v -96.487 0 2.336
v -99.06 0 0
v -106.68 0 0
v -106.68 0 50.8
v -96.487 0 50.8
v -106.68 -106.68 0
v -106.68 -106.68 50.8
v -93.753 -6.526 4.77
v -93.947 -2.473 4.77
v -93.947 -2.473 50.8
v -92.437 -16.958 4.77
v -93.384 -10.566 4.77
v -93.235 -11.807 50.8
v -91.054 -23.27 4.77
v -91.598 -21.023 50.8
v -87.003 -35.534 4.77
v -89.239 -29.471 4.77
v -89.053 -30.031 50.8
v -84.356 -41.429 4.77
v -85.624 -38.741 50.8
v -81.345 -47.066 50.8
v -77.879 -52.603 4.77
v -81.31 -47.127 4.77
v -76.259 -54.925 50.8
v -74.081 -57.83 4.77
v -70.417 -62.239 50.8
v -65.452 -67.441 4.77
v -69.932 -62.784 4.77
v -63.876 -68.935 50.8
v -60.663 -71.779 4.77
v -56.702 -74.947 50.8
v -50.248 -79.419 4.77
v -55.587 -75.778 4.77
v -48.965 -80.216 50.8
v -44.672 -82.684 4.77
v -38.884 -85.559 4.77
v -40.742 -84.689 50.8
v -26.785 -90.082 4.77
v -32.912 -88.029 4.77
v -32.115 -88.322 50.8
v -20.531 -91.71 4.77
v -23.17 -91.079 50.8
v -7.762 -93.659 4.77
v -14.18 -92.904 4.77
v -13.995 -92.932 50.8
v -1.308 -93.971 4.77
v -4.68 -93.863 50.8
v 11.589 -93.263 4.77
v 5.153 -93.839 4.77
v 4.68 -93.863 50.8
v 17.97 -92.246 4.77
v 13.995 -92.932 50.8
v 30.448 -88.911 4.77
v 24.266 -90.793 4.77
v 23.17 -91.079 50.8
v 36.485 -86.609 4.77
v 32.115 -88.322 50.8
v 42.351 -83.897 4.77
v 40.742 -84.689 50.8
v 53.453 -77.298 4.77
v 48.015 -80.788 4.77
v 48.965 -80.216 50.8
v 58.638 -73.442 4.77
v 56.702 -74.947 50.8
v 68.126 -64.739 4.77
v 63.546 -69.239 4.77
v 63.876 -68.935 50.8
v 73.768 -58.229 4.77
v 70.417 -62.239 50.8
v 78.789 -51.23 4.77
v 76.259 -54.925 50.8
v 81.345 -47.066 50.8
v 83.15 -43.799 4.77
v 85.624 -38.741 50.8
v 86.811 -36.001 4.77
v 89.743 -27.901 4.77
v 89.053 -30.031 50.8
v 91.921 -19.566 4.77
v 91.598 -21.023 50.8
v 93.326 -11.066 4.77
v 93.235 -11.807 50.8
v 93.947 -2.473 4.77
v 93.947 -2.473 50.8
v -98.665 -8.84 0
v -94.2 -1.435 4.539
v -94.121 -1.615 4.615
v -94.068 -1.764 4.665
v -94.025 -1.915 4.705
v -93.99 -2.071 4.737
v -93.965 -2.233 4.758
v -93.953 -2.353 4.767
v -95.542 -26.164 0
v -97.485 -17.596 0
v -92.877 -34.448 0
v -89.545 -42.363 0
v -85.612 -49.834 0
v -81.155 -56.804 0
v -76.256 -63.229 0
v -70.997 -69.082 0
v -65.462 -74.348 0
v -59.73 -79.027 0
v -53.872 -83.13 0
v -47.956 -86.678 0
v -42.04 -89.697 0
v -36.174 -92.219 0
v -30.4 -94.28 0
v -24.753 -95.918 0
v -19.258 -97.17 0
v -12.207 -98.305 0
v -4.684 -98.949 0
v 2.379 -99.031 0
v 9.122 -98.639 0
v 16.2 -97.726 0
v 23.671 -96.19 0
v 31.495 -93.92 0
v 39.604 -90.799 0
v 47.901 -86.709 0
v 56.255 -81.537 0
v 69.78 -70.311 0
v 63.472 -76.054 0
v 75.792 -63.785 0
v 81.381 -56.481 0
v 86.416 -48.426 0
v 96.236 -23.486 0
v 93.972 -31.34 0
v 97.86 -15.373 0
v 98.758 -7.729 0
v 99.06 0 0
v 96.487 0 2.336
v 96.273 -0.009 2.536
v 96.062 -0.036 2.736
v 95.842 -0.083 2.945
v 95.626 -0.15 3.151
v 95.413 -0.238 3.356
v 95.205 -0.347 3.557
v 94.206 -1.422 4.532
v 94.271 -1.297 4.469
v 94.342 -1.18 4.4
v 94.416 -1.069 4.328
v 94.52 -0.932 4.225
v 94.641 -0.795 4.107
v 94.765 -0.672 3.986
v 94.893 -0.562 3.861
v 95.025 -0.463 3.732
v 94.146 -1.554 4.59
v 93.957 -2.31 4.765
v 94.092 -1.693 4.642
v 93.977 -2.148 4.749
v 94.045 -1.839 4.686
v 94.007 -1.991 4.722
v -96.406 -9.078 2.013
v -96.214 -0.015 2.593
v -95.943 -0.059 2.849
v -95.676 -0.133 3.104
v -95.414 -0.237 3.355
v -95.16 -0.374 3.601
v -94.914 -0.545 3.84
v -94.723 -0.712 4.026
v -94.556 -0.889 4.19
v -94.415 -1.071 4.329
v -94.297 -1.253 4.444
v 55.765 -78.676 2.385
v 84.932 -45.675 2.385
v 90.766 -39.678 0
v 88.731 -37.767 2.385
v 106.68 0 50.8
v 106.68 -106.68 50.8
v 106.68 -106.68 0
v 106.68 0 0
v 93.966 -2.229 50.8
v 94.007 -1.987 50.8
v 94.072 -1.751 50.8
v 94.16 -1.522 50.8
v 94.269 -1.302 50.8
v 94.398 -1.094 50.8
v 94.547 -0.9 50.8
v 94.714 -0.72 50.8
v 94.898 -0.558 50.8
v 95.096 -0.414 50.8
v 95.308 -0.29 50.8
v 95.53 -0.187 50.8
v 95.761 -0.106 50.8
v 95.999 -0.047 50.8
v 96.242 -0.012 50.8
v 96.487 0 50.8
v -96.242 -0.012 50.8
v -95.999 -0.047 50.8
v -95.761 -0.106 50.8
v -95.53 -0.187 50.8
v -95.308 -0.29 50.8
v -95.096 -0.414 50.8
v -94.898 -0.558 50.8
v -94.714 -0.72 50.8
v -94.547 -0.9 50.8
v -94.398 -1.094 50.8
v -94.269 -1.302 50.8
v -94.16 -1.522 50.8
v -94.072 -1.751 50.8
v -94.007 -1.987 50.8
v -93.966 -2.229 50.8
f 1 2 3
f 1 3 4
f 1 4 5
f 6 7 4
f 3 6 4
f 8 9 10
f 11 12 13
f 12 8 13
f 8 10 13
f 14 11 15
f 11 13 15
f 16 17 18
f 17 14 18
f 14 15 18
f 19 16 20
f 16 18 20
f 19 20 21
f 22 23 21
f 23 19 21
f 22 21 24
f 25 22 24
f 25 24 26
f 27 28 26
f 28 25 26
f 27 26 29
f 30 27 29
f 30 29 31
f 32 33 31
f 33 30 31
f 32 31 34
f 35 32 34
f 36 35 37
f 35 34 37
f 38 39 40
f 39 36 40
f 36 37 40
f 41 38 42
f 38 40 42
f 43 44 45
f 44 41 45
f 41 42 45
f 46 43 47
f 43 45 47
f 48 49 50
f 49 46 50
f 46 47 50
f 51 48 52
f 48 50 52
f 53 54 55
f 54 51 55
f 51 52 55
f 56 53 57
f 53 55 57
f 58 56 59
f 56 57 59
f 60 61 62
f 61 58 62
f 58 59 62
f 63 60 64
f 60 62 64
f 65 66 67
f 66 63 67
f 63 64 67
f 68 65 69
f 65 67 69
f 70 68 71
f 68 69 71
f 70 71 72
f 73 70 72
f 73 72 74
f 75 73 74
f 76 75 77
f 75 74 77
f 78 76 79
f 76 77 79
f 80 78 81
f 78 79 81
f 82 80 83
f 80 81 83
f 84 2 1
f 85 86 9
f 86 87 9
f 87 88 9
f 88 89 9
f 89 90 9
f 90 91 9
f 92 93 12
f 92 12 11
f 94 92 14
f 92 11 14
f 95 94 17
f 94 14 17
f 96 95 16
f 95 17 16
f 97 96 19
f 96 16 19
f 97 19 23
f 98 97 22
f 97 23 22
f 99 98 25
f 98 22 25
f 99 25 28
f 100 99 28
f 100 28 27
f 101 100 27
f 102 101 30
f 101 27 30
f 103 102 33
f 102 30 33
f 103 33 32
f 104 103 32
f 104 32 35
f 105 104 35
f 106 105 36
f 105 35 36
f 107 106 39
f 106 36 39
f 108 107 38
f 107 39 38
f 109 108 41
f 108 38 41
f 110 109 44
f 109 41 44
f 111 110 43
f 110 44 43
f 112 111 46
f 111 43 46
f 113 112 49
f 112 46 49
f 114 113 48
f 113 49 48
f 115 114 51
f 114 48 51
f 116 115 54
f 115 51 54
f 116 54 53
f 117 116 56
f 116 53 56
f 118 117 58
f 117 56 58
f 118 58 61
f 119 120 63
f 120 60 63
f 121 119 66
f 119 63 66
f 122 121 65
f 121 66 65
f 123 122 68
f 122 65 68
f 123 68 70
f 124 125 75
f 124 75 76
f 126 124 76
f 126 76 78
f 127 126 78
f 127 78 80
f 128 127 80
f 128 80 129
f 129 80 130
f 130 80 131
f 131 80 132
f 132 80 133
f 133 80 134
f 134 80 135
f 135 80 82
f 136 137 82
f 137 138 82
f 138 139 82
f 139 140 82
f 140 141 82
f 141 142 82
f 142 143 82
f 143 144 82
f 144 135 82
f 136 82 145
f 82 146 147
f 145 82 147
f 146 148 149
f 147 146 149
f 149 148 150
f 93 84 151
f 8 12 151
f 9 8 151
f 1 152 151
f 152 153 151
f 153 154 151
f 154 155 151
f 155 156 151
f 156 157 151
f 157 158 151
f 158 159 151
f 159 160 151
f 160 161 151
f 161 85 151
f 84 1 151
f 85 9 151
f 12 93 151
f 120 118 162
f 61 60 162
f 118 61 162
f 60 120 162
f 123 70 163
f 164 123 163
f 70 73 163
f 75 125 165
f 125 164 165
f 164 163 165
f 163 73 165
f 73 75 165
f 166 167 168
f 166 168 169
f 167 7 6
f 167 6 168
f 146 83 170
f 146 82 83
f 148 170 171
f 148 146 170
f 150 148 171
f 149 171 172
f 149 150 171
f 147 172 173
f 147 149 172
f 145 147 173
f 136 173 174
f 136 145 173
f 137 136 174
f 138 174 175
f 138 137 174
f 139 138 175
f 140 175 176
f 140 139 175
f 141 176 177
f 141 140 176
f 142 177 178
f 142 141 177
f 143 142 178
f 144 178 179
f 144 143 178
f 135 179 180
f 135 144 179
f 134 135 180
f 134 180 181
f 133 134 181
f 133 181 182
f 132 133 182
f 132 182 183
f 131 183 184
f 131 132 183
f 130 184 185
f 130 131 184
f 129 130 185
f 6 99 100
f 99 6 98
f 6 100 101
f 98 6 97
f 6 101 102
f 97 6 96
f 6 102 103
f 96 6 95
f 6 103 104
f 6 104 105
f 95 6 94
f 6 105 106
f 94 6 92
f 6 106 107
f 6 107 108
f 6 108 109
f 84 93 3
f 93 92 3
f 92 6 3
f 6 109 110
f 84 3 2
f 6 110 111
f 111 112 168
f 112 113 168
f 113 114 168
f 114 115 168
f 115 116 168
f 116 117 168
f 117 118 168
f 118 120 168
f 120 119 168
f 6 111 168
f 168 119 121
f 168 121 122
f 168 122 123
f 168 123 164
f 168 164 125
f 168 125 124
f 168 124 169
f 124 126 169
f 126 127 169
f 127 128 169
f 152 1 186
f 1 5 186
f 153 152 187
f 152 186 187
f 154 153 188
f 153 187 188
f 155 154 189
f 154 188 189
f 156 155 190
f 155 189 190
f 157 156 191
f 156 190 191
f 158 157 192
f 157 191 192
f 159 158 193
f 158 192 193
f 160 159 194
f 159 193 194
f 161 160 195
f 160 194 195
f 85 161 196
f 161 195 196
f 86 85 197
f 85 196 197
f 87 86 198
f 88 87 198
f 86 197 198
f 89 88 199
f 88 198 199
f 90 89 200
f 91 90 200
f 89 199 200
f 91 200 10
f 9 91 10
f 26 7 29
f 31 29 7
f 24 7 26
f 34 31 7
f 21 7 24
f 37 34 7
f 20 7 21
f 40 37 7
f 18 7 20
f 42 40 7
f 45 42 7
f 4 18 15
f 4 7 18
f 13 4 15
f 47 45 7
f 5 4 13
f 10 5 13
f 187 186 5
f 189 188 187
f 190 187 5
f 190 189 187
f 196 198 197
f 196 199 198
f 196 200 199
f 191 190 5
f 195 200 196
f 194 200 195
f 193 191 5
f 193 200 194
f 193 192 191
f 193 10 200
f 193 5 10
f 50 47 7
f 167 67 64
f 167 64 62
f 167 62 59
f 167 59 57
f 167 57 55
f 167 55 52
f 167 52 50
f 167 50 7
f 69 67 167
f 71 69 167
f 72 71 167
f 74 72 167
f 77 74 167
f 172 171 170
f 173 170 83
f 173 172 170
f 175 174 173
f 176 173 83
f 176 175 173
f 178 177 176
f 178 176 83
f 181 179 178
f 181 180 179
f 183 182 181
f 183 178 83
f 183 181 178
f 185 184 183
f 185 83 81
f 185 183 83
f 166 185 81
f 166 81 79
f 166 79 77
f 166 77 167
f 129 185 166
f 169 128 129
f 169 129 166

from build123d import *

# Parameters (mm, degrees)
SKETCH2_W           = 213.36
SKETCH2_H           = 213.36
SKETCH2_R           = 93.98
BOSS_EXTRUDE1_DEPTH = 50.8
SKETCH4_W           = 431.498092941
SKETCH4_H           = 427.351859682
CUT_EXTRUDE1_DEPTH  = 106.68
FILLET1_R           = 2.54


with BuildPart() as part:
    # Sketch2 → Boss-Extrude1 (new body)
    with BuildSketch(Plane.XY.offset(50.8)):
        Rectangle(SKETCH2_W, SKETCH2_H)
        Circle(SKETCH2_R, mode=Mode.SUBTRACT)
    extrude(amount=-BOSS_EXTRUDE1_DEPTH)

    # Cut-Loft1: read off the stored shape, not the designer's step
    # Cut-Loft1: loft between two sections, ruled curve by curve
    cut_loft1_from = [
        Edge.make_bspline([(-5.225836659, 98.922061398, 0), (-203.069959455, 88.47038808, 0), (-192.618286137, -109.373734716, 0), (5.225836659, -98.922061398, 0), (203.069959455, -88.47038808, 0), (192.618286137, 109.373734716, 0), (-5.225836659, 98.922061398, 0)], [0, 0, 0, 0, 0.5, 0.5, 0.5, 1, 1, 1, 1], 3, [1, 0.333333333, 0.333333333, 1, 0.333333333, 0.333333333, 1]),
    ]
    cut_loft1_to = [
        Edge.make_bspline([(82.069205503, 45.791766816, 50.8), (-9.514328128, 209.930177822, 50.8), (-173.652739134, 118.34664419, 50.8), (-82.069205503, -45.791766816, 50.8), (9.514328128, -209.930177822, 50.8), (173.652739134, -118.34664419, 50.8), (82.069205503, 45.791766816, 50.8)], [0, 0, 0, 0, 0.5, 0.5, 0.5, 1, 1, 1, 1], 3, [1, 0.333333333, 0.333333333, 1, 0.333333333, 0.333333333, 1]),
    ]
    cut_loft1 = Solid(Shell([*[Face.make_surface_from_curves(cut_loft1_from[k], cut_loft1_to[k]) for k in range(1)], Face(Wire(cut_loft1_from)), Face(Wire(cut_loft1_to))]))
    add(cut_loft1, mode=Mode.SUBTRACT)

    # Sketch4 → Cut-Extrude1 (cut)
    with BuildSketch(Plane(origin=(0, 106.68, 0), x_dir=(1, 0, 0), z_dir=(0, 1, 0))):
        with Locations((-43.743226098, -53.764043901)):
            Rectangle(SKETCH4_W, SKETCH4_H)
    extrude(amount=-CUT_EXTRUDE1_DEPTH, mode=Mode.SUBTRACT)

    # Fillet1
    fillet1_edges = [part.edges().sort_by_distance(p)[0] for p in [
        (93.98, 0, 27.785112978),
        (-93.98, 0, 27.785112678),
    ]]
    fillet(fillet1_edges, radius=FILLET1_R)


solid = part.part
